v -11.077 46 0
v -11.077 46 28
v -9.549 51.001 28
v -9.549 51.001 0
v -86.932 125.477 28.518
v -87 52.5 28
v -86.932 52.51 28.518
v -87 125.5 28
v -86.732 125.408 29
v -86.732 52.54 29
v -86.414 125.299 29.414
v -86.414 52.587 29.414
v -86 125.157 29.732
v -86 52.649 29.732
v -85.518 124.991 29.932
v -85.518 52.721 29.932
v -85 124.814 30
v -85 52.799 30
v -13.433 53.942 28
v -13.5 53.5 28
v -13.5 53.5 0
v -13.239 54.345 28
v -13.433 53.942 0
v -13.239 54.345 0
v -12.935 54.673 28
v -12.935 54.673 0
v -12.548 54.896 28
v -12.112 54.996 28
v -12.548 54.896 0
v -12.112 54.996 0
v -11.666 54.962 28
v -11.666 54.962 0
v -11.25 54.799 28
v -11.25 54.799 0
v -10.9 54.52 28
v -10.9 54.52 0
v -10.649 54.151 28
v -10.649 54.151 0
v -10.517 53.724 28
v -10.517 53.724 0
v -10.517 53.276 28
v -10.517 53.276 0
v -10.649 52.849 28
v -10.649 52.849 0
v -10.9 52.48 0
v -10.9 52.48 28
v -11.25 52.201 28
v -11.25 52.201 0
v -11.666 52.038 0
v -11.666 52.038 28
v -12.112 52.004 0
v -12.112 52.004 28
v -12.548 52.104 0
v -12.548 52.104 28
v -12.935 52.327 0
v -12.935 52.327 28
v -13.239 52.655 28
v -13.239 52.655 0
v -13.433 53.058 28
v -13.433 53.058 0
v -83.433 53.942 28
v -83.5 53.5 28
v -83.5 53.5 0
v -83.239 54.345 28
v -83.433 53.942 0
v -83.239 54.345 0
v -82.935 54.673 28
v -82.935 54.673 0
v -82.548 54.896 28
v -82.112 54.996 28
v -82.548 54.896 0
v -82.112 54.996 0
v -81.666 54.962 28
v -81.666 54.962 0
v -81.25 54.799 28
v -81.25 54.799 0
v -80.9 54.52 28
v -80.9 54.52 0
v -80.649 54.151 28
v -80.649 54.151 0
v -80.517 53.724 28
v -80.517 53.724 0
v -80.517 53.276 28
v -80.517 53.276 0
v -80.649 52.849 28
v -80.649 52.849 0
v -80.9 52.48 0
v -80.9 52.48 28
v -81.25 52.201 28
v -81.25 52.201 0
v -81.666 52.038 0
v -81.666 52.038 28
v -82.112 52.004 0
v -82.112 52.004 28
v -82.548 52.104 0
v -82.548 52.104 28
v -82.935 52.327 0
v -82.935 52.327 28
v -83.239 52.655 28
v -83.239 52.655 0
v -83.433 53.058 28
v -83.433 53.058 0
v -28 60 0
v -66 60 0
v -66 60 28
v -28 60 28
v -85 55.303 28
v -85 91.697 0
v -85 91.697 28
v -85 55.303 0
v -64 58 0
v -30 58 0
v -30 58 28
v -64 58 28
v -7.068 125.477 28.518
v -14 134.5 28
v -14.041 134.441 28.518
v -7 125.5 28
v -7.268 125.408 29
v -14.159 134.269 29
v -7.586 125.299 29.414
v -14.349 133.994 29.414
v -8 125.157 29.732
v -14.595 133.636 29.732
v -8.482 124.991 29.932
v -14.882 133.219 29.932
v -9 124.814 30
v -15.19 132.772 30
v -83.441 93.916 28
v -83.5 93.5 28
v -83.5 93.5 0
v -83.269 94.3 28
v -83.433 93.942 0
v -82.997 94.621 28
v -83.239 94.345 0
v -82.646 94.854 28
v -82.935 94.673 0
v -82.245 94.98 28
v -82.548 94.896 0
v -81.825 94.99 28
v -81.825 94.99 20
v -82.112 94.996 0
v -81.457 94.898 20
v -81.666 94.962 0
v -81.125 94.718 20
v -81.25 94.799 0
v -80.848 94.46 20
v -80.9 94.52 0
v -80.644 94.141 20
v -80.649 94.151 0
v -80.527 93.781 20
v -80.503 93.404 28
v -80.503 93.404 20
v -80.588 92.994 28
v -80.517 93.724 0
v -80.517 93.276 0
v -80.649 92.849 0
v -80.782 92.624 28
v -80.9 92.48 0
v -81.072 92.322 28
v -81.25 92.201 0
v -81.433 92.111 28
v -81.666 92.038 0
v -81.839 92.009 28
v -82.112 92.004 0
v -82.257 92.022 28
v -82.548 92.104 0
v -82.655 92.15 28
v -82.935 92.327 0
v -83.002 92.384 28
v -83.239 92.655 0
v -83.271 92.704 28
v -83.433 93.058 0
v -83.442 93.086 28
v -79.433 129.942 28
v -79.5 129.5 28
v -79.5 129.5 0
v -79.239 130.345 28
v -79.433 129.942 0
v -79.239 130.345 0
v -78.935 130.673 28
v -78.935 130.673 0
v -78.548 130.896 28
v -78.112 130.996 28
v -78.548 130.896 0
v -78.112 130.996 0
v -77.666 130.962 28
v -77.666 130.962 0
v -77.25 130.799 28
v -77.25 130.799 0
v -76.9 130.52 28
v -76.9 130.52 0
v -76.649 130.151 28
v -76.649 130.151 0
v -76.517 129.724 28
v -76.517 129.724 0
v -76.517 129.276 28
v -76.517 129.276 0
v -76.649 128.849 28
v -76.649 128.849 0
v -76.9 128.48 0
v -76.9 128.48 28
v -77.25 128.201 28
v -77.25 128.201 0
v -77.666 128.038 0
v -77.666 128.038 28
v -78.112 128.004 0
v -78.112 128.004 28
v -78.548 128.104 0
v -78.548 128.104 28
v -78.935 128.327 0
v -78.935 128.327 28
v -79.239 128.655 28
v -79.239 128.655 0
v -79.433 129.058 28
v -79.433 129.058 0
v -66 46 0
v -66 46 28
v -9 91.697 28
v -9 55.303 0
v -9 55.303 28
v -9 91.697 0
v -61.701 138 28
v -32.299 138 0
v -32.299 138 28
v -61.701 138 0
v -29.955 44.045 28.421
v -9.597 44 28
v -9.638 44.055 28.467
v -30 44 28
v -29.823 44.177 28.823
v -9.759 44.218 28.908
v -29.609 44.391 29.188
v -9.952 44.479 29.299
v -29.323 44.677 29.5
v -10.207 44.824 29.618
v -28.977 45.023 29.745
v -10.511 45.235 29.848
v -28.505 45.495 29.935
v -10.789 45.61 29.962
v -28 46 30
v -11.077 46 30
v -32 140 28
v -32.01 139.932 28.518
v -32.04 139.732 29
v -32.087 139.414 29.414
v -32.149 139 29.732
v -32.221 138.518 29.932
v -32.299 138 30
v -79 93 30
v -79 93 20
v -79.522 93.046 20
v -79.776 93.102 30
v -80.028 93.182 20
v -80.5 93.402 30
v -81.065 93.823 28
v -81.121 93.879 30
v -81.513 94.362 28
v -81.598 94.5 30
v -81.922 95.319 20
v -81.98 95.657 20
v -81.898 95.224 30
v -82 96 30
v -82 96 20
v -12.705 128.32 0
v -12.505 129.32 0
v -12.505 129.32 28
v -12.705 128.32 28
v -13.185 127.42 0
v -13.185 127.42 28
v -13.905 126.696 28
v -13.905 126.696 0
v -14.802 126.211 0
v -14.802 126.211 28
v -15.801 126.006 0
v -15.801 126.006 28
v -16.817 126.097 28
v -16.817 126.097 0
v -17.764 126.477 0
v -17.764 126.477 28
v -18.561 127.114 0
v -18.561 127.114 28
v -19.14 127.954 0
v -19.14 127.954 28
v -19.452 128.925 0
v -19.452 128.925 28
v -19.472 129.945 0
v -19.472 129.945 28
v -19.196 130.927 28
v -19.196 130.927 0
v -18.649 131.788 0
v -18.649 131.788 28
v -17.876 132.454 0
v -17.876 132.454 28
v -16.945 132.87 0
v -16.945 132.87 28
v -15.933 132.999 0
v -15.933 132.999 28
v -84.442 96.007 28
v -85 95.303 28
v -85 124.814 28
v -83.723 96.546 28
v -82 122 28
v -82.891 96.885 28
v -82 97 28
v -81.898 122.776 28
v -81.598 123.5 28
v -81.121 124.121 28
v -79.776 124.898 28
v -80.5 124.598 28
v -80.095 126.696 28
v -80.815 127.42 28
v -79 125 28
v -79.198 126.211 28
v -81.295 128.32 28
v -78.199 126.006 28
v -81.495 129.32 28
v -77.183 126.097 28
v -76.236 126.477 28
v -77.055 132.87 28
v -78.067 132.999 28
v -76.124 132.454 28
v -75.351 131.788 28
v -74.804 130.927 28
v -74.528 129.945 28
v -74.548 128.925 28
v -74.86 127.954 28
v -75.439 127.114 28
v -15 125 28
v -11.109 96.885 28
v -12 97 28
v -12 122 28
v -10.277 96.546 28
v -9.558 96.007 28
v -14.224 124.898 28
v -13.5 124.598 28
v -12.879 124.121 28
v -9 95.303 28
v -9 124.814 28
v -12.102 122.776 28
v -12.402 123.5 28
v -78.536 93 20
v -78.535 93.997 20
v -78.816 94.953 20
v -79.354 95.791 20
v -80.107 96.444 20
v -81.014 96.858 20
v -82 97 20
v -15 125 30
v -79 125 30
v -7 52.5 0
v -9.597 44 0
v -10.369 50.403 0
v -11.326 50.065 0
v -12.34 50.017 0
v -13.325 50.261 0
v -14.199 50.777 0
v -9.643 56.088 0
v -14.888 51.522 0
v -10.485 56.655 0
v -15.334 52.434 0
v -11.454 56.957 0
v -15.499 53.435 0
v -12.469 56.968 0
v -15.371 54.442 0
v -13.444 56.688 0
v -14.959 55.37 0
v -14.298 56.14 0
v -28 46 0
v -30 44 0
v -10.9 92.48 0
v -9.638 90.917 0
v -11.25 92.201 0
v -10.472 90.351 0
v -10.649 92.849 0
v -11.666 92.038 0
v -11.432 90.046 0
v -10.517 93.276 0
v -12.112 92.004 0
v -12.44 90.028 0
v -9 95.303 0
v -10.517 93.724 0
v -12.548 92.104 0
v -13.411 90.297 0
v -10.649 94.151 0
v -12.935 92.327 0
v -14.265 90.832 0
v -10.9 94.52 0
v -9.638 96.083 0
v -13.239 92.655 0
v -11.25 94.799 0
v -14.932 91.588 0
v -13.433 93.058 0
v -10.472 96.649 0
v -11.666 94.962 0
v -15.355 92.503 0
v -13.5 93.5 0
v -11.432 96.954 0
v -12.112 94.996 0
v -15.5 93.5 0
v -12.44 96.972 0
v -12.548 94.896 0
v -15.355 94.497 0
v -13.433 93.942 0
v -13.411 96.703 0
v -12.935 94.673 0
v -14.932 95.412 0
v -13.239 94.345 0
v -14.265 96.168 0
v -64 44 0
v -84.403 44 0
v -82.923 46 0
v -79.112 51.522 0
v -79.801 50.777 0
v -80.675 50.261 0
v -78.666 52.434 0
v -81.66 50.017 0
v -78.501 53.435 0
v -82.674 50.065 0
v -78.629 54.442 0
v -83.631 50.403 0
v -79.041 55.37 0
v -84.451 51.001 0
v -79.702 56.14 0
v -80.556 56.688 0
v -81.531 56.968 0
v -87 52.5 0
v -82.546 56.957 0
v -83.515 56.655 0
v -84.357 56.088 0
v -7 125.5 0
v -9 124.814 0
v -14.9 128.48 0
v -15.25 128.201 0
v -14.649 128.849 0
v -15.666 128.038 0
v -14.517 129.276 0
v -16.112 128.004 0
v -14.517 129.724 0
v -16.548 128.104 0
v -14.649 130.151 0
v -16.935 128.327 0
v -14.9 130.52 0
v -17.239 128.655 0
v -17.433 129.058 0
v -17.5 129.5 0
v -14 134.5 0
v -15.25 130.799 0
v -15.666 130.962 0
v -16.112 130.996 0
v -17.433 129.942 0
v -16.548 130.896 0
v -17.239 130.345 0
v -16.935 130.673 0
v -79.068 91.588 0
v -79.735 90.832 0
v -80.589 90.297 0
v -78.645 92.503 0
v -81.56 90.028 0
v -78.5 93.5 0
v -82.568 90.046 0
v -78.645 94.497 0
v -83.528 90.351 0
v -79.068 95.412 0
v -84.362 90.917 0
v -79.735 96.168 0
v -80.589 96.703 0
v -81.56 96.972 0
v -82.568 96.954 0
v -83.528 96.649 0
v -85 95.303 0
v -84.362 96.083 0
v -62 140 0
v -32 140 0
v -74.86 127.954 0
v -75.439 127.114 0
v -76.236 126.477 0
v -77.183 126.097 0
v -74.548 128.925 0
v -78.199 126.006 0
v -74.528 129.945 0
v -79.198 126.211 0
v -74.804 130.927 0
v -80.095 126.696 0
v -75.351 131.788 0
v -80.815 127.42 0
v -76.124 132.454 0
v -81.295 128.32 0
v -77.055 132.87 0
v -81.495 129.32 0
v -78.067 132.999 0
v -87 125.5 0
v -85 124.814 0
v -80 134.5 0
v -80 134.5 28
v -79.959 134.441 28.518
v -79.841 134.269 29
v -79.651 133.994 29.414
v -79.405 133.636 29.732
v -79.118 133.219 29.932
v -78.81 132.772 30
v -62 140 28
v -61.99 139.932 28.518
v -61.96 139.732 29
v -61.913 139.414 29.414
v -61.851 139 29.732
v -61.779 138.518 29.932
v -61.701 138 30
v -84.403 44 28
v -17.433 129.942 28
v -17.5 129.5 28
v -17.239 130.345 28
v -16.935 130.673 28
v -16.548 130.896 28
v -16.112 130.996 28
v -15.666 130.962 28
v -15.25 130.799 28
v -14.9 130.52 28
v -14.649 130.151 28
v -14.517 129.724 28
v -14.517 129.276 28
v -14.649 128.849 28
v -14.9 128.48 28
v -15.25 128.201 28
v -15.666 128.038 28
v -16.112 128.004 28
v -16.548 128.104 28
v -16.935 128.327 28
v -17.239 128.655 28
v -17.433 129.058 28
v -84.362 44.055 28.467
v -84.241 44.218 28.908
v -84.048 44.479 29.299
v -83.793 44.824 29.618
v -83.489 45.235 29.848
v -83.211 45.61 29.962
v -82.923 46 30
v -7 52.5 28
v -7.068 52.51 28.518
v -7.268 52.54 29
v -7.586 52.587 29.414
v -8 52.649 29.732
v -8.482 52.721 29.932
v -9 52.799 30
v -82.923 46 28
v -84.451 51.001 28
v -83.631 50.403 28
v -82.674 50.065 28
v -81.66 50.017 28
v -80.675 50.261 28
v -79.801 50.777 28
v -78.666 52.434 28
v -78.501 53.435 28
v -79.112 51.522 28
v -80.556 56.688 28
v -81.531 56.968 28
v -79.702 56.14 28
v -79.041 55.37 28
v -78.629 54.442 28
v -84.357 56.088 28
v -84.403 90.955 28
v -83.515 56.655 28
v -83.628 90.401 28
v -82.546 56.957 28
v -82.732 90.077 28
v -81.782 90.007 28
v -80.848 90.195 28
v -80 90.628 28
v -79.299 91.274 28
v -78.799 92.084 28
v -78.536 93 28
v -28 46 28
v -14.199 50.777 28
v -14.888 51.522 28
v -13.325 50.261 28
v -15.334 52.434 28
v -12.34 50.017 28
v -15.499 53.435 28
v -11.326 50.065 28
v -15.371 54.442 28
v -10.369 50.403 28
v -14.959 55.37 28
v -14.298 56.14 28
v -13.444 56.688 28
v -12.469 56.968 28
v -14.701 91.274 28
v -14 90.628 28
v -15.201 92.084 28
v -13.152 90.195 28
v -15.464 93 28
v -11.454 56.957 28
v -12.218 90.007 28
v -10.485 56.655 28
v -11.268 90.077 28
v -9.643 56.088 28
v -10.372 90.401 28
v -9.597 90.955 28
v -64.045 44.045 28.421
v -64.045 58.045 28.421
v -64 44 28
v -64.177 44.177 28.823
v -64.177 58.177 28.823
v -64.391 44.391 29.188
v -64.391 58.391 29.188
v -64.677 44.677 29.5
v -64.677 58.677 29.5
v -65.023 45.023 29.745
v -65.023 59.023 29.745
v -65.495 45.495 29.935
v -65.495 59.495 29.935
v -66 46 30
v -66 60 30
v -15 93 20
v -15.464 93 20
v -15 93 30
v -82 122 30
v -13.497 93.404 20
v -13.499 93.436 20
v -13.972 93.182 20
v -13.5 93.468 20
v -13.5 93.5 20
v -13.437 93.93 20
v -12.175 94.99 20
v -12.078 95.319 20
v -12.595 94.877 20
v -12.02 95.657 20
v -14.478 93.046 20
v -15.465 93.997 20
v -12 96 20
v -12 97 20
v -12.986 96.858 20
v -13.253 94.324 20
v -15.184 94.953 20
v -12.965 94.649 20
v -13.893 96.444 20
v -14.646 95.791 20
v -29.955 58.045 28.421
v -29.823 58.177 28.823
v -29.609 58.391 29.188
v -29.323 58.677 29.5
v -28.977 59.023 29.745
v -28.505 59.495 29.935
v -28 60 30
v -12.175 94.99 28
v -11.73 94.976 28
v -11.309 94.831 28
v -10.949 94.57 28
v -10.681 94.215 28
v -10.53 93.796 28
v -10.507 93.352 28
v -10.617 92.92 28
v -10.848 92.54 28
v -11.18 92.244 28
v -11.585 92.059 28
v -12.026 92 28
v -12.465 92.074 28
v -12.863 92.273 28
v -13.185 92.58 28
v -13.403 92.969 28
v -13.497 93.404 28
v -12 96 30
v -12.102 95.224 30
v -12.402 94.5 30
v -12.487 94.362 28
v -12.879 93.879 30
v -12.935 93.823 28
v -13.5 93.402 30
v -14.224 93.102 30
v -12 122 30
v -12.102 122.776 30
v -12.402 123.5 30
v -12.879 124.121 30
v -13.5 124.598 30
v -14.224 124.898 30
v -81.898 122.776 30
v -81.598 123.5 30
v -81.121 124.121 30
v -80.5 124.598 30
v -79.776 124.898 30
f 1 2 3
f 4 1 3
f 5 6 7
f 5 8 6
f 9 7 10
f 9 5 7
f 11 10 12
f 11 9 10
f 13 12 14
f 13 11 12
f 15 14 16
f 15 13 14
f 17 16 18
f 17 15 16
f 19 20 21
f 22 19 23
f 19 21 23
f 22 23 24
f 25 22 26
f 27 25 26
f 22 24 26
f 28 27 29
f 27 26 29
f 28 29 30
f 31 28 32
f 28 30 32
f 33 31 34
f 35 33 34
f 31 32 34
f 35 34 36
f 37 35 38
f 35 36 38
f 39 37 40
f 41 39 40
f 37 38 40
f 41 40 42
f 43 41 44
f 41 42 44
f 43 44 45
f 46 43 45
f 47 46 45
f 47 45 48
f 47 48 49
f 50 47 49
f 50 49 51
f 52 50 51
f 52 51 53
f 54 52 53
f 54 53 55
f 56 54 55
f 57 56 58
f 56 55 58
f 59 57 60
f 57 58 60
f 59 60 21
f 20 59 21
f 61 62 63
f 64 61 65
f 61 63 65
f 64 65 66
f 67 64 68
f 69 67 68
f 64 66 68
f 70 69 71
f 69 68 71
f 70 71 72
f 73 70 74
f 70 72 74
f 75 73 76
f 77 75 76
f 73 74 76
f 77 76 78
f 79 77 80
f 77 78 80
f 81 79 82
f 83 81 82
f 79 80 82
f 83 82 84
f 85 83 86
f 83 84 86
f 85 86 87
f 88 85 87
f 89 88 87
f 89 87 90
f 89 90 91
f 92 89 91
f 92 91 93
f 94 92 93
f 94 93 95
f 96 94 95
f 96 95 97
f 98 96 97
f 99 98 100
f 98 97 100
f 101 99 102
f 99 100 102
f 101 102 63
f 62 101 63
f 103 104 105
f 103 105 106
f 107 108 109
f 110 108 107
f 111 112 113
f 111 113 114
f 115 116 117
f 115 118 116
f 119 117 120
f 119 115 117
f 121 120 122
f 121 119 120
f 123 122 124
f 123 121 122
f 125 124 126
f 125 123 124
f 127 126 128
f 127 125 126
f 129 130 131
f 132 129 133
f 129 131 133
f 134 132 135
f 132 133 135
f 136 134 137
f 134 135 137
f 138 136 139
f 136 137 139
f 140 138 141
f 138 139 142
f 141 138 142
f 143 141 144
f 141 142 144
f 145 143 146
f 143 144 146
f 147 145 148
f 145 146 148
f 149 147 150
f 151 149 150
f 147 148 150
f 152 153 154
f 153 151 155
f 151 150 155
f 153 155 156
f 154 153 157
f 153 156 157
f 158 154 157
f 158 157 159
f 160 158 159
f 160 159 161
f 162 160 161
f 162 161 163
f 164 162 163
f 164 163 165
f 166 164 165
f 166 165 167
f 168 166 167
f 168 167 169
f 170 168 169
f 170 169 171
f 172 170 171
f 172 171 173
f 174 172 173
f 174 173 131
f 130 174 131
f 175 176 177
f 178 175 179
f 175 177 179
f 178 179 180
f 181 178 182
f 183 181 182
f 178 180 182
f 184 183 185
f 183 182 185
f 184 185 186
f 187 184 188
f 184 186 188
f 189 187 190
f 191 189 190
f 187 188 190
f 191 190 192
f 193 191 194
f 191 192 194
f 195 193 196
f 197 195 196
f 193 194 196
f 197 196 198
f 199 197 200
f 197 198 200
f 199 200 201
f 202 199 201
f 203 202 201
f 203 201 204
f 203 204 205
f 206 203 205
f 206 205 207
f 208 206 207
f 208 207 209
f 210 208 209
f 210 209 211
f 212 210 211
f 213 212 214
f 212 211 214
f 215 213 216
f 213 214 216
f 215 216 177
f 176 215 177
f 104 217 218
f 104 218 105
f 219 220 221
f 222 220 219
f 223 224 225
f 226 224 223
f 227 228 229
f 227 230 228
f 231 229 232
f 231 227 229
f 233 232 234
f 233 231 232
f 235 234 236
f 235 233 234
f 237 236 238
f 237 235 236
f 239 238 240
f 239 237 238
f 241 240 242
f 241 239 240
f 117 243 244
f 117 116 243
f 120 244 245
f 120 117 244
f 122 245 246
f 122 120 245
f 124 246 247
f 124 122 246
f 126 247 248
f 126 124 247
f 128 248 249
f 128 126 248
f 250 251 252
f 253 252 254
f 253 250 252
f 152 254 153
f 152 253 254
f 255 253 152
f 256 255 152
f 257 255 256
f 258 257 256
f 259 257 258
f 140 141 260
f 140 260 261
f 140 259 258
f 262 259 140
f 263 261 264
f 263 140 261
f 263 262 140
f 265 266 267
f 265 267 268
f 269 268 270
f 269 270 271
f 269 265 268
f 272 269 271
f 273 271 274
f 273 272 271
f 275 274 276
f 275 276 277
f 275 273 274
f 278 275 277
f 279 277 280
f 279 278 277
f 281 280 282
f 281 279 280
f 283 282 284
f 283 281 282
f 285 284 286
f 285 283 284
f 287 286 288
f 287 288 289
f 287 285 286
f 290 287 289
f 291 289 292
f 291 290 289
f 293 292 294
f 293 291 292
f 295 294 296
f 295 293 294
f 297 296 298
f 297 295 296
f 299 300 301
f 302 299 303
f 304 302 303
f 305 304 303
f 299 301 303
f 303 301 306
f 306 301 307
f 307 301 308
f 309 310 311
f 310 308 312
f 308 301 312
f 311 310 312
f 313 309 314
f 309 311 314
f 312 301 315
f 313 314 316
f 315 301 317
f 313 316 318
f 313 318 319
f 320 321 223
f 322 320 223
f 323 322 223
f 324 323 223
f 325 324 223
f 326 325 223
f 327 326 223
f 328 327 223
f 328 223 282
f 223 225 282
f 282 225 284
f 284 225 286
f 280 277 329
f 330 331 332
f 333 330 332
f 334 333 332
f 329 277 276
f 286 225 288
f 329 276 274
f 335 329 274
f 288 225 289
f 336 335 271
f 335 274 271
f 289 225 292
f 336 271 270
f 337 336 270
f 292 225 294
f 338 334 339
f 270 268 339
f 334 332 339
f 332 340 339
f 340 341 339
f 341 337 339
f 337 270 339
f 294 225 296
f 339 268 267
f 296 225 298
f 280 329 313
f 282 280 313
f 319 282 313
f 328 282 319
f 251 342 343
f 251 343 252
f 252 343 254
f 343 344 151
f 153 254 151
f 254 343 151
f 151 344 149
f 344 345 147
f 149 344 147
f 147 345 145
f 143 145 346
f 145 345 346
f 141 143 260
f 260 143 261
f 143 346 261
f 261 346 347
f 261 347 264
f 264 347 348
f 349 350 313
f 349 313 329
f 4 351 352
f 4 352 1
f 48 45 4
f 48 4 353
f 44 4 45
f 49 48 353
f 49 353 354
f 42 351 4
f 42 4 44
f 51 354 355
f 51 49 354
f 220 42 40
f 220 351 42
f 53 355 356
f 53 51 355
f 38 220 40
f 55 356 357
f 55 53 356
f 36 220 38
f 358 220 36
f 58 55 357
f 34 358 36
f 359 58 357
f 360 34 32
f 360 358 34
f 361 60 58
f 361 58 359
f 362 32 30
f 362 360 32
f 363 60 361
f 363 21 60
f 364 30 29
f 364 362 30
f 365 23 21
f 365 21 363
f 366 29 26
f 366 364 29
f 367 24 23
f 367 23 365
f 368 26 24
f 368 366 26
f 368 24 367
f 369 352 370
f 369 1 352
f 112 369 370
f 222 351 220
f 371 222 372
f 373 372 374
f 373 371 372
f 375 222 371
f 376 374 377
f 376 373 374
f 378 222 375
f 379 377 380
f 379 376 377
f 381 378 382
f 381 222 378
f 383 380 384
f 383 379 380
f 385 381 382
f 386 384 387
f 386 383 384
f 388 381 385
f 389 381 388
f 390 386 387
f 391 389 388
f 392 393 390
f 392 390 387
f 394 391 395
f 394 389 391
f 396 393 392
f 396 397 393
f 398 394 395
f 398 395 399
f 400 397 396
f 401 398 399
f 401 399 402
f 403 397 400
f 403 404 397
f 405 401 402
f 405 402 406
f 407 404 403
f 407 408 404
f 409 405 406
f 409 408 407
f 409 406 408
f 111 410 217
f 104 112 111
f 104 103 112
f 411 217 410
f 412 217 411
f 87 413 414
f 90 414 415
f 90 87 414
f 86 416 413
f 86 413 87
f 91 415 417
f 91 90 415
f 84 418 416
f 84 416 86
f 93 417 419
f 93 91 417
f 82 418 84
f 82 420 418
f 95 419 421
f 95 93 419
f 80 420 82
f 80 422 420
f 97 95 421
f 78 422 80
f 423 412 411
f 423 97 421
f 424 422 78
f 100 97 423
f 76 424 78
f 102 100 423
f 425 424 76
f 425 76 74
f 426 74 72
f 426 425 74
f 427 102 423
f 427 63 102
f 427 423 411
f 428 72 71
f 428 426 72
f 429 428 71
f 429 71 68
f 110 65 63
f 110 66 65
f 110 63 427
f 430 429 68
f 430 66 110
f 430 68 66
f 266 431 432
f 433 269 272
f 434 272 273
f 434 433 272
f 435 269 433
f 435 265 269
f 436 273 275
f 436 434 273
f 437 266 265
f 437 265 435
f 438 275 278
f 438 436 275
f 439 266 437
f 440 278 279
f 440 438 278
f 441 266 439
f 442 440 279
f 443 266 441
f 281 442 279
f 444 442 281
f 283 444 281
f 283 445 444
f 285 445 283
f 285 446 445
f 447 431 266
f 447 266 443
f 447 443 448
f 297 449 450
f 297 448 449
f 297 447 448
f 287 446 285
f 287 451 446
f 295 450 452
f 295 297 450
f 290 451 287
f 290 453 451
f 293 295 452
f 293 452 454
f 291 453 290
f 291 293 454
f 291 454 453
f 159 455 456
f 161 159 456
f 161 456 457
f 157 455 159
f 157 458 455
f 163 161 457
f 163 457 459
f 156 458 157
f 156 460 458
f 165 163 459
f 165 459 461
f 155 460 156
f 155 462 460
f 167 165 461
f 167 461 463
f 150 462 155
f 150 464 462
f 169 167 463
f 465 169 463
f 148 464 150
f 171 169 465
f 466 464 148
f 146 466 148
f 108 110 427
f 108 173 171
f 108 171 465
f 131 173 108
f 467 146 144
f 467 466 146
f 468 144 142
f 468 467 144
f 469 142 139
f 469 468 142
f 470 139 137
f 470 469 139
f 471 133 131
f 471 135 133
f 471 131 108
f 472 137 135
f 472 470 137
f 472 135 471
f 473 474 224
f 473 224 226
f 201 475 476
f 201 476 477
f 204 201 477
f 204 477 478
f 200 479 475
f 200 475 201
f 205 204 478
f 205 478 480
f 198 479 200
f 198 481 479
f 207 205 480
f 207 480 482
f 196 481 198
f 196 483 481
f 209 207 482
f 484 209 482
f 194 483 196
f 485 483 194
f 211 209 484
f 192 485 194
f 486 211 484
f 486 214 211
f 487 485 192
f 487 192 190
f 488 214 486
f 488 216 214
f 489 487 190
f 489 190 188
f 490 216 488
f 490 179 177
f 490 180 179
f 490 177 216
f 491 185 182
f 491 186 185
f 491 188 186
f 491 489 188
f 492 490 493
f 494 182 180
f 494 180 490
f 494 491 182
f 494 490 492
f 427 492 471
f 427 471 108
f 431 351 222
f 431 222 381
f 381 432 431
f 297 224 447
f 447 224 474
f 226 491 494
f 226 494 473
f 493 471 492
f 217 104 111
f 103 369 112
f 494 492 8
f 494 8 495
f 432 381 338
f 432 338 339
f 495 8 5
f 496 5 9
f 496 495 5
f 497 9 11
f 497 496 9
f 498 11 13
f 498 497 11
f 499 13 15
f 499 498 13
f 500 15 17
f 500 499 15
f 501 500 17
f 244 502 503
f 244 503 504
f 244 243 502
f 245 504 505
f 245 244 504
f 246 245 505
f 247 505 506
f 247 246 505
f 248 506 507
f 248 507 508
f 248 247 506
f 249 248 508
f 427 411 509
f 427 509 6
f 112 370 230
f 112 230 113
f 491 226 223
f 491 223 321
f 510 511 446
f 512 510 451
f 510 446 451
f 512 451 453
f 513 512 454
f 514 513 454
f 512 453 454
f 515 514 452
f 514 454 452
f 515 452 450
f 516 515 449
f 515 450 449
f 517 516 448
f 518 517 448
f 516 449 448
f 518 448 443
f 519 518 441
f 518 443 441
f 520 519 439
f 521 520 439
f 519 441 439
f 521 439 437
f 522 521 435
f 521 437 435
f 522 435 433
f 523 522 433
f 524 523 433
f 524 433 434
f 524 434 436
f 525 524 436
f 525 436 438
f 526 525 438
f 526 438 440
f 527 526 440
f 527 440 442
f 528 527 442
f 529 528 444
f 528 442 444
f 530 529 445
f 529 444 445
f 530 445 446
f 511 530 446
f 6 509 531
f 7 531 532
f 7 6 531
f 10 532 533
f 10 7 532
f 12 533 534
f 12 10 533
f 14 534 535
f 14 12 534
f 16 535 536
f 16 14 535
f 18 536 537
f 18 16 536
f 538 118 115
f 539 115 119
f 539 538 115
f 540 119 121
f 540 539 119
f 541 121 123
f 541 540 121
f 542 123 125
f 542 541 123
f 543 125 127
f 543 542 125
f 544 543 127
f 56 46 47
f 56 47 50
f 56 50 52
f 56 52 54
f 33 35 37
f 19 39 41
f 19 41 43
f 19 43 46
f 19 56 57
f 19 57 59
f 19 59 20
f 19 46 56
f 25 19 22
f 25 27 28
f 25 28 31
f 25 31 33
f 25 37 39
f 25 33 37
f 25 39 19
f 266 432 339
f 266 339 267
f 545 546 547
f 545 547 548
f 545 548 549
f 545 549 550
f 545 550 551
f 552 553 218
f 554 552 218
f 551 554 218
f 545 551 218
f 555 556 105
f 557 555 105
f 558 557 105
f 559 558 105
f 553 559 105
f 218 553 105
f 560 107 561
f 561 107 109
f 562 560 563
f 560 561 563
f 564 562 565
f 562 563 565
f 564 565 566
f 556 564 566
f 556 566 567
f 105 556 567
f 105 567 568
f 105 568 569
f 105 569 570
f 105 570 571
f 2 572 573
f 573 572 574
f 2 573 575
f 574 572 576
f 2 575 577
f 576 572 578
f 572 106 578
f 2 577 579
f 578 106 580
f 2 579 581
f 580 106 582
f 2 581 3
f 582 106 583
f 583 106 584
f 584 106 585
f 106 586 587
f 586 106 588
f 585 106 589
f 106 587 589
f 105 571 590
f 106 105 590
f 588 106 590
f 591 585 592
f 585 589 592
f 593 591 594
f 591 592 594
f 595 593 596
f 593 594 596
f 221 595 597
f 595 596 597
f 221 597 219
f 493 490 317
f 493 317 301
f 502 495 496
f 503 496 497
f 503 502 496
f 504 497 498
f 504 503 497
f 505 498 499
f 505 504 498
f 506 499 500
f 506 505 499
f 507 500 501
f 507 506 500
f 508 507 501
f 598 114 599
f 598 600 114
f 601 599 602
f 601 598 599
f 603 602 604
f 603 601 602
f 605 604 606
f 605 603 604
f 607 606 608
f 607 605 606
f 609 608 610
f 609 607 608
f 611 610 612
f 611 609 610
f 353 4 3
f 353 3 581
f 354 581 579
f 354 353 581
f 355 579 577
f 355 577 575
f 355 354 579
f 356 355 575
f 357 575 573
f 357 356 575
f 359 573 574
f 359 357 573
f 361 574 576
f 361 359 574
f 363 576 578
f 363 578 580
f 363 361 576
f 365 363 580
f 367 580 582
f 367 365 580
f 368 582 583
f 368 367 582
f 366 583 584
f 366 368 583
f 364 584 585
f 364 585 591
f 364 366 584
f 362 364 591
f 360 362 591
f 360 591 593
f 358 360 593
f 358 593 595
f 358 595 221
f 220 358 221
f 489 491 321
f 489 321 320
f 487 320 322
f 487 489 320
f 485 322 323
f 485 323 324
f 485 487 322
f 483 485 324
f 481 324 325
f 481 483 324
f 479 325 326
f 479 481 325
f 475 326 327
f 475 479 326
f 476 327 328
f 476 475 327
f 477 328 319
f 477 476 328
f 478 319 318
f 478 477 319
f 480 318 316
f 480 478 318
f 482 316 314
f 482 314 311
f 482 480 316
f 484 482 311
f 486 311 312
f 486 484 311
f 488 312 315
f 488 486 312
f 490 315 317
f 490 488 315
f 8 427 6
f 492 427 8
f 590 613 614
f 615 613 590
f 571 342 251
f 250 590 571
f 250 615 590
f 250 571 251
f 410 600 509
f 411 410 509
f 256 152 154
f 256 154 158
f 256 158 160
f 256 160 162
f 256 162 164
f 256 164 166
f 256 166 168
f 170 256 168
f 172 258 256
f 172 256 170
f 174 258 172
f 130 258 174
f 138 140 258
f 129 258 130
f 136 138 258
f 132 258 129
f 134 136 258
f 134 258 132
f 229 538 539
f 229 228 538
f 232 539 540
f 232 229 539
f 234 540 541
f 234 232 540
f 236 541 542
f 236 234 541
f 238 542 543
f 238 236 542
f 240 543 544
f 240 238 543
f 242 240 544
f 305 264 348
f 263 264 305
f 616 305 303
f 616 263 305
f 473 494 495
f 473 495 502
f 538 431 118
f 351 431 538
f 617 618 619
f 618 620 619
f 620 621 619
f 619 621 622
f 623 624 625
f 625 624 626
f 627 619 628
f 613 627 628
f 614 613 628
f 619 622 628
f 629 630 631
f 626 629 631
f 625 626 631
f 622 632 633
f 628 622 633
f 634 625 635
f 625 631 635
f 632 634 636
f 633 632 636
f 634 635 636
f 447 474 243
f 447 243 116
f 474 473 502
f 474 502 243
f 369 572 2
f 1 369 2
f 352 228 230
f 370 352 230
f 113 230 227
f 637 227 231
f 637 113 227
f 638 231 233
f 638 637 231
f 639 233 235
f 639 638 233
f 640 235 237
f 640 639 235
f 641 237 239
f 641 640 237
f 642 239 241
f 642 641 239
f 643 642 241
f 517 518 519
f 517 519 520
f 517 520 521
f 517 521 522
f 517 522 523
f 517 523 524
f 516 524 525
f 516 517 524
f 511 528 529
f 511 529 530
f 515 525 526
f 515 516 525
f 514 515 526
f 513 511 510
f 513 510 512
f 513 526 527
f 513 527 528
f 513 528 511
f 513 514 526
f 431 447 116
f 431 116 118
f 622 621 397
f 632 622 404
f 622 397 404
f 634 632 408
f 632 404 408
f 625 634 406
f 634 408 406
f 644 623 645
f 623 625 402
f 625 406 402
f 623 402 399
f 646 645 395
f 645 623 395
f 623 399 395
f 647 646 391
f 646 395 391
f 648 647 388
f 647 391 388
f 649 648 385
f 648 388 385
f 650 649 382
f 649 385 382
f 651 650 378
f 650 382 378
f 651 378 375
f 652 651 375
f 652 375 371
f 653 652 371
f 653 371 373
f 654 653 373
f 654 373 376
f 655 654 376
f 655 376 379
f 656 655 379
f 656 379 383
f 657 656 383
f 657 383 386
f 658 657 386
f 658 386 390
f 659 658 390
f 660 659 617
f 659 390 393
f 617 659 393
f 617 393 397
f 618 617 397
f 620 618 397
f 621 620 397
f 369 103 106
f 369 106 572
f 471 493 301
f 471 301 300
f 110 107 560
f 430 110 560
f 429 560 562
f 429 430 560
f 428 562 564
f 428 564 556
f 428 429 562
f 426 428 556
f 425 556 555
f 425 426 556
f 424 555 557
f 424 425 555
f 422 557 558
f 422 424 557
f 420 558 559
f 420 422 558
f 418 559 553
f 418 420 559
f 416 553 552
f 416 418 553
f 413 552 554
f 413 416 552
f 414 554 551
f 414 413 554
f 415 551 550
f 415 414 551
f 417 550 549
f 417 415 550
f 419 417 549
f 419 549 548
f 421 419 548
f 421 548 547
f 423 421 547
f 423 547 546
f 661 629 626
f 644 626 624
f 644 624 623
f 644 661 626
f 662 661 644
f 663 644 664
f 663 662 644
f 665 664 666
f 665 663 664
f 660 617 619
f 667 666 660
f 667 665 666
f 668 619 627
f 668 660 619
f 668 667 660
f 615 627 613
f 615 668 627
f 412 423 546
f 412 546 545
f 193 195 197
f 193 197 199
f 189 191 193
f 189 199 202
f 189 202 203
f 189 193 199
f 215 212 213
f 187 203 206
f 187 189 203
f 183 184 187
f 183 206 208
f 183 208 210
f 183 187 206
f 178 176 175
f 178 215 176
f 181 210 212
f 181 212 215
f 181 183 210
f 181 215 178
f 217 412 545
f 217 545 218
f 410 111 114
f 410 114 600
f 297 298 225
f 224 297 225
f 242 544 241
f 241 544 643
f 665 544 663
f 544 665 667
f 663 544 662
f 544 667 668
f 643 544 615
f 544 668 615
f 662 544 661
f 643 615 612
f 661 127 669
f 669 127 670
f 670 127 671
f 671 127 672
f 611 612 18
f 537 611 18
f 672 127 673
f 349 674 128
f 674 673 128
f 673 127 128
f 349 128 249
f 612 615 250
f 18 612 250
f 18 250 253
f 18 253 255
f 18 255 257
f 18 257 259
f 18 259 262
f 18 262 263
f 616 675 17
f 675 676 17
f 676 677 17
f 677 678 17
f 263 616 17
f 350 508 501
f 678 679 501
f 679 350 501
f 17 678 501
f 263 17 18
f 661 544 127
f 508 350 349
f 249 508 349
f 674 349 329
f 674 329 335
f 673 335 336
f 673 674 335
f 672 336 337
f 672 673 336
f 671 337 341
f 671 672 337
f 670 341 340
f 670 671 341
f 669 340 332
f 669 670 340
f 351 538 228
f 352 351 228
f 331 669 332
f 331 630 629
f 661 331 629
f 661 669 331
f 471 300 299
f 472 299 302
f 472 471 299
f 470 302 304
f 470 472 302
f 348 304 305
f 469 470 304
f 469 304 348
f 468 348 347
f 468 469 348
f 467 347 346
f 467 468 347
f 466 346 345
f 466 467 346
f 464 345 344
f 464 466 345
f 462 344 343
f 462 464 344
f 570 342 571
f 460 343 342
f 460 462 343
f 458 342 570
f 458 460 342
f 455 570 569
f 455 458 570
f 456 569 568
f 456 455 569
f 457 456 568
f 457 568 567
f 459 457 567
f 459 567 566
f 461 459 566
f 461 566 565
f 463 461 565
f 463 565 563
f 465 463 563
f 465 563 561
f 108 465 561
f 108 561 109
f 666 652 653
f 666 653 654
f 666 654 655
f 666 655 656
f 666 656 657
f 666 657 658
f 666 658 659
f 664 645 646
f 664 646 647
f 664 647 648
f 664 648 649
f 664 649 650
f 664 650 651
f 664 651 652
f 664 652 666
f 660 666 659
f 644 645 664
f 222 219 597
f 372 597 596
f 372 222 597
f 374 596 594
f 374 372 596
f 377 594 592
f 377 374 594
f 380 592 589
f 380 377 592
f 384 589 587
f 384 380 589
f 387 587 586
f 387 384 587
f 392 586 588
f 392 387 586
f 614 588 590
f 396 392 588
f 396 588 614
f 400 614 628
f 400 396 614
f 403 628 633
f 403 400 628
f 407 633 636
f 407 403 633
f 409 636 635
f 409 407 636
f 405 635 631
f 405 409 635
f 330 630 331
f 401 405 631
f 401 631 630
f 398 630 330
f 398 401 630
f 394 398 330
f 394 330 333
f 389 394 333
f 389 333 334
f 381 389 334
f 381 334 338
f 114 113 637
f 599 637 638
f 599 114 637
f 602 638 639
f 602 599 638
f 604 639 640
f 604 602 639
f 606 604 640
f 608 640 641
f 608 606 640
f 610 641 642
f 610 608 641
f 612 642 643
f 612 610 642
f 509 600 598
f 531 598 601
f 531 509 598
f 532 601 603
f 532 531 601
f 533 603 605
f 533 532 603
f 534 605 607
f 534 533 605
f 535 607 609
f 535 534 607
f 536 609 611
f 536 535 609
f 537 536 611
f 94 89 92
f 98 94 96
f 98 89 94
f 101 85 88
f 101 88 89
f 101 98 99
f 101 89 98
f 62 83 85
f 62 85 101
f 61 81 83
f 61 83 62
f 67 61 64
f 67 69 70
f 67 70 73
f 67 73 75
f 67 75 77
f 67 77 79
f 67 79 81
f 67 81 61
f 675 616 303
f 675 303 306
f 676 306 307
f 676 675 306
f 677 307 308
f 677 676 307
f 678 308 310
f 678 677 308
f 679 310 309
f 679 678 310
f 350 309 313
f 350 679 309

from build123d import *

# Parameters (mm, degrees)
EXTRUDE_1_DEPTH     = 30
FILLET_4_R          = 2
SKETCH_2_R          = 1.5
CUT_EXTRUDE_1_DEPTH = 28
SHELL_3_DEPTH       = 28
CUT_EXTRUDE_2_DEPTH = 10


# Read off the part's stored shape, not the designer's step: 抽壳3
with BuildPart() as part:
    # 草图1 → 凸台-拉伸1 (new body)
    with BuildSketch(Plane.XY):
        Polygon((-84.402777778, 44), (-87, 52.5), (-87, 125.5), (-80, 134.5), (-62, 140), (-32, 140), (-14, 134.5), (-7, 125.5), (-7, 52.5), (-9.597222222, 44), (-30, 44), (-30, 58), (-64, 58), (-64, 44), align=None)
    extrude(amount=EXTRUDE_1_DEPTH)

    # 圆角4
    fillet_4_edges = [part.edges().sort_by_distance(p)[0] for p in [
        (-47, 58, 30),
        (-30, 51, 30),
        (-19.798611111, 44, 30),
        (-8.298611111, 48.25, 30),
        (-7, 89, 30),
        (-10.5, 130, 30),
        (-23, 137.25, 30),
        (-47, 140, 30),
        (-71, 137.25, 30),
        (-83.5, 130, 30),
        (-74.201388889, 44, 30),
        (-87, 89, 30),
        (-85.701388889, 48.25, 30),
        (-64, 51, 30),
    ]]
    fillet(fillet_4_edges, radius=FILLET_4_R)

    # 草图2 → 切除-拉伸1 (cut)
    with BuildSketch(Plane(origin=(0, 0, 0), x_dir=(-1, 0, 0), z_dir=(0, 0, -1))):
        with Locations((82, 53.5)):
            Circle(SKETCH_2_R)
        with Locations((12, 53.5)):
            Circle(SKETCH_2_R)
        with Locations((12, 93.5)):
            Circle(SKETCH_2_R)
        with Locations((82, 93.5)):
            Circle(SKETCH_2_R)
        with Locations((78, 129.5)):
            Circle(SKETCH_2_R)
        with Locations((16, 129.5)):
            Circle(SKETCH_2_R)
    extrude(amount=-CUT_EXTRUDE_1_DEPTH, mode=Mode.SUBTRACT)

    # 抽壳3 outline → 抽壳3 (cut)
    with BuildSketch(Plane.XY):
        with BuildLine():
            Line((-9, 55.302775638), (-9, 91.697224362))
            ThreePointArc((-9, 91.697224362), (-15.5, 93.5), (-9, 95.302775638))
            Line((-9, 95.302775638), (-9, 124.8137845))
            Line((-9, 124.8137845), (-12.504644228, 129.31975565))
            ThreePointArc((-12.504644228, 129.31975565), (-18.560753547, 127.114095293), (-15.933003152, 132.999358716))
            Line((-15.933003152, 132.999358716), (-32.298738264, 138))
            Line((-32.298738264, 138), (-61.701261736, 138))
            Line((-61.701261736, 138), (-78.066996848, 132.999358716))
            ThreePointArc((-78.066996848, 132.999358716), (-75.439246453, 127.114095293), (-81.495355772, 129.31975565))
            Line((-81.495355772, 129.31975565), (-85, 124.8137845))
            Line((-85, 124.8137845), (-85, 95.302775638))
            ThreePointArc((-85, 95.302775638), (-78.5, 93.5), (-85, 91.697224362))
            Line((-85, 91.697224362), (-85, 55.302775638))
            ThreePointArc((-85, 55.302775638), (-78.528186006, 53.943291769), (-84.450768591, 51.001253651))
            Line((-84.450768591, 51.001253651), (-82.922607753, 46))
            Line((-82.922607753, 46), (-66, 46))
            Line((-66, 46), (-66, 60))
            Line((-66, 60), (-28, 60))
            Line((-28, 60), (-28, 46))
            Line((-28, 46), (-11.077392247, 46))
            Line((-11.077392247, 46), (-9.549231409, 51.001253651))
            ThreePointArc((-9.549231409, 51.001253651), (-15.471813994, 53.943291769), (-9, 55.302775638))
        make_face()
    extrude(amount=SHELL_3_DEPTH, mode=Mode.SUBTRACT)

    # 草图3 → 切除-拉伸2 (cut)
    with BuildSketch(Plane.XY.offset(30)):
        with BuildLine():
            Line((-79, 125), (-15, 125))
            ThreePointArc((-15, 125), (-12.878679656, 124.121320344), (-12, 122))
            Line((-12, 122), (-12, 96))
            ThreePointArc((-12, 96), (-12.878679656, 93.878679656), (-15, 93))
            Line((-15, 93), (-79, 93))
            ThreePointArc((-79, 93), (-81.121320344, 93.878679656), (-82, 96))
            Line((-82, 96), (-82, 122))
            ThreePointArc((-82, 122), (-81.121320344, 124.121320344), (-79, 125))
        make_face()
    extrude(amount=-CUT_EXTRUDE_2_DEPTH, mode=Mode.SUBTRACT)


solid = part.part
